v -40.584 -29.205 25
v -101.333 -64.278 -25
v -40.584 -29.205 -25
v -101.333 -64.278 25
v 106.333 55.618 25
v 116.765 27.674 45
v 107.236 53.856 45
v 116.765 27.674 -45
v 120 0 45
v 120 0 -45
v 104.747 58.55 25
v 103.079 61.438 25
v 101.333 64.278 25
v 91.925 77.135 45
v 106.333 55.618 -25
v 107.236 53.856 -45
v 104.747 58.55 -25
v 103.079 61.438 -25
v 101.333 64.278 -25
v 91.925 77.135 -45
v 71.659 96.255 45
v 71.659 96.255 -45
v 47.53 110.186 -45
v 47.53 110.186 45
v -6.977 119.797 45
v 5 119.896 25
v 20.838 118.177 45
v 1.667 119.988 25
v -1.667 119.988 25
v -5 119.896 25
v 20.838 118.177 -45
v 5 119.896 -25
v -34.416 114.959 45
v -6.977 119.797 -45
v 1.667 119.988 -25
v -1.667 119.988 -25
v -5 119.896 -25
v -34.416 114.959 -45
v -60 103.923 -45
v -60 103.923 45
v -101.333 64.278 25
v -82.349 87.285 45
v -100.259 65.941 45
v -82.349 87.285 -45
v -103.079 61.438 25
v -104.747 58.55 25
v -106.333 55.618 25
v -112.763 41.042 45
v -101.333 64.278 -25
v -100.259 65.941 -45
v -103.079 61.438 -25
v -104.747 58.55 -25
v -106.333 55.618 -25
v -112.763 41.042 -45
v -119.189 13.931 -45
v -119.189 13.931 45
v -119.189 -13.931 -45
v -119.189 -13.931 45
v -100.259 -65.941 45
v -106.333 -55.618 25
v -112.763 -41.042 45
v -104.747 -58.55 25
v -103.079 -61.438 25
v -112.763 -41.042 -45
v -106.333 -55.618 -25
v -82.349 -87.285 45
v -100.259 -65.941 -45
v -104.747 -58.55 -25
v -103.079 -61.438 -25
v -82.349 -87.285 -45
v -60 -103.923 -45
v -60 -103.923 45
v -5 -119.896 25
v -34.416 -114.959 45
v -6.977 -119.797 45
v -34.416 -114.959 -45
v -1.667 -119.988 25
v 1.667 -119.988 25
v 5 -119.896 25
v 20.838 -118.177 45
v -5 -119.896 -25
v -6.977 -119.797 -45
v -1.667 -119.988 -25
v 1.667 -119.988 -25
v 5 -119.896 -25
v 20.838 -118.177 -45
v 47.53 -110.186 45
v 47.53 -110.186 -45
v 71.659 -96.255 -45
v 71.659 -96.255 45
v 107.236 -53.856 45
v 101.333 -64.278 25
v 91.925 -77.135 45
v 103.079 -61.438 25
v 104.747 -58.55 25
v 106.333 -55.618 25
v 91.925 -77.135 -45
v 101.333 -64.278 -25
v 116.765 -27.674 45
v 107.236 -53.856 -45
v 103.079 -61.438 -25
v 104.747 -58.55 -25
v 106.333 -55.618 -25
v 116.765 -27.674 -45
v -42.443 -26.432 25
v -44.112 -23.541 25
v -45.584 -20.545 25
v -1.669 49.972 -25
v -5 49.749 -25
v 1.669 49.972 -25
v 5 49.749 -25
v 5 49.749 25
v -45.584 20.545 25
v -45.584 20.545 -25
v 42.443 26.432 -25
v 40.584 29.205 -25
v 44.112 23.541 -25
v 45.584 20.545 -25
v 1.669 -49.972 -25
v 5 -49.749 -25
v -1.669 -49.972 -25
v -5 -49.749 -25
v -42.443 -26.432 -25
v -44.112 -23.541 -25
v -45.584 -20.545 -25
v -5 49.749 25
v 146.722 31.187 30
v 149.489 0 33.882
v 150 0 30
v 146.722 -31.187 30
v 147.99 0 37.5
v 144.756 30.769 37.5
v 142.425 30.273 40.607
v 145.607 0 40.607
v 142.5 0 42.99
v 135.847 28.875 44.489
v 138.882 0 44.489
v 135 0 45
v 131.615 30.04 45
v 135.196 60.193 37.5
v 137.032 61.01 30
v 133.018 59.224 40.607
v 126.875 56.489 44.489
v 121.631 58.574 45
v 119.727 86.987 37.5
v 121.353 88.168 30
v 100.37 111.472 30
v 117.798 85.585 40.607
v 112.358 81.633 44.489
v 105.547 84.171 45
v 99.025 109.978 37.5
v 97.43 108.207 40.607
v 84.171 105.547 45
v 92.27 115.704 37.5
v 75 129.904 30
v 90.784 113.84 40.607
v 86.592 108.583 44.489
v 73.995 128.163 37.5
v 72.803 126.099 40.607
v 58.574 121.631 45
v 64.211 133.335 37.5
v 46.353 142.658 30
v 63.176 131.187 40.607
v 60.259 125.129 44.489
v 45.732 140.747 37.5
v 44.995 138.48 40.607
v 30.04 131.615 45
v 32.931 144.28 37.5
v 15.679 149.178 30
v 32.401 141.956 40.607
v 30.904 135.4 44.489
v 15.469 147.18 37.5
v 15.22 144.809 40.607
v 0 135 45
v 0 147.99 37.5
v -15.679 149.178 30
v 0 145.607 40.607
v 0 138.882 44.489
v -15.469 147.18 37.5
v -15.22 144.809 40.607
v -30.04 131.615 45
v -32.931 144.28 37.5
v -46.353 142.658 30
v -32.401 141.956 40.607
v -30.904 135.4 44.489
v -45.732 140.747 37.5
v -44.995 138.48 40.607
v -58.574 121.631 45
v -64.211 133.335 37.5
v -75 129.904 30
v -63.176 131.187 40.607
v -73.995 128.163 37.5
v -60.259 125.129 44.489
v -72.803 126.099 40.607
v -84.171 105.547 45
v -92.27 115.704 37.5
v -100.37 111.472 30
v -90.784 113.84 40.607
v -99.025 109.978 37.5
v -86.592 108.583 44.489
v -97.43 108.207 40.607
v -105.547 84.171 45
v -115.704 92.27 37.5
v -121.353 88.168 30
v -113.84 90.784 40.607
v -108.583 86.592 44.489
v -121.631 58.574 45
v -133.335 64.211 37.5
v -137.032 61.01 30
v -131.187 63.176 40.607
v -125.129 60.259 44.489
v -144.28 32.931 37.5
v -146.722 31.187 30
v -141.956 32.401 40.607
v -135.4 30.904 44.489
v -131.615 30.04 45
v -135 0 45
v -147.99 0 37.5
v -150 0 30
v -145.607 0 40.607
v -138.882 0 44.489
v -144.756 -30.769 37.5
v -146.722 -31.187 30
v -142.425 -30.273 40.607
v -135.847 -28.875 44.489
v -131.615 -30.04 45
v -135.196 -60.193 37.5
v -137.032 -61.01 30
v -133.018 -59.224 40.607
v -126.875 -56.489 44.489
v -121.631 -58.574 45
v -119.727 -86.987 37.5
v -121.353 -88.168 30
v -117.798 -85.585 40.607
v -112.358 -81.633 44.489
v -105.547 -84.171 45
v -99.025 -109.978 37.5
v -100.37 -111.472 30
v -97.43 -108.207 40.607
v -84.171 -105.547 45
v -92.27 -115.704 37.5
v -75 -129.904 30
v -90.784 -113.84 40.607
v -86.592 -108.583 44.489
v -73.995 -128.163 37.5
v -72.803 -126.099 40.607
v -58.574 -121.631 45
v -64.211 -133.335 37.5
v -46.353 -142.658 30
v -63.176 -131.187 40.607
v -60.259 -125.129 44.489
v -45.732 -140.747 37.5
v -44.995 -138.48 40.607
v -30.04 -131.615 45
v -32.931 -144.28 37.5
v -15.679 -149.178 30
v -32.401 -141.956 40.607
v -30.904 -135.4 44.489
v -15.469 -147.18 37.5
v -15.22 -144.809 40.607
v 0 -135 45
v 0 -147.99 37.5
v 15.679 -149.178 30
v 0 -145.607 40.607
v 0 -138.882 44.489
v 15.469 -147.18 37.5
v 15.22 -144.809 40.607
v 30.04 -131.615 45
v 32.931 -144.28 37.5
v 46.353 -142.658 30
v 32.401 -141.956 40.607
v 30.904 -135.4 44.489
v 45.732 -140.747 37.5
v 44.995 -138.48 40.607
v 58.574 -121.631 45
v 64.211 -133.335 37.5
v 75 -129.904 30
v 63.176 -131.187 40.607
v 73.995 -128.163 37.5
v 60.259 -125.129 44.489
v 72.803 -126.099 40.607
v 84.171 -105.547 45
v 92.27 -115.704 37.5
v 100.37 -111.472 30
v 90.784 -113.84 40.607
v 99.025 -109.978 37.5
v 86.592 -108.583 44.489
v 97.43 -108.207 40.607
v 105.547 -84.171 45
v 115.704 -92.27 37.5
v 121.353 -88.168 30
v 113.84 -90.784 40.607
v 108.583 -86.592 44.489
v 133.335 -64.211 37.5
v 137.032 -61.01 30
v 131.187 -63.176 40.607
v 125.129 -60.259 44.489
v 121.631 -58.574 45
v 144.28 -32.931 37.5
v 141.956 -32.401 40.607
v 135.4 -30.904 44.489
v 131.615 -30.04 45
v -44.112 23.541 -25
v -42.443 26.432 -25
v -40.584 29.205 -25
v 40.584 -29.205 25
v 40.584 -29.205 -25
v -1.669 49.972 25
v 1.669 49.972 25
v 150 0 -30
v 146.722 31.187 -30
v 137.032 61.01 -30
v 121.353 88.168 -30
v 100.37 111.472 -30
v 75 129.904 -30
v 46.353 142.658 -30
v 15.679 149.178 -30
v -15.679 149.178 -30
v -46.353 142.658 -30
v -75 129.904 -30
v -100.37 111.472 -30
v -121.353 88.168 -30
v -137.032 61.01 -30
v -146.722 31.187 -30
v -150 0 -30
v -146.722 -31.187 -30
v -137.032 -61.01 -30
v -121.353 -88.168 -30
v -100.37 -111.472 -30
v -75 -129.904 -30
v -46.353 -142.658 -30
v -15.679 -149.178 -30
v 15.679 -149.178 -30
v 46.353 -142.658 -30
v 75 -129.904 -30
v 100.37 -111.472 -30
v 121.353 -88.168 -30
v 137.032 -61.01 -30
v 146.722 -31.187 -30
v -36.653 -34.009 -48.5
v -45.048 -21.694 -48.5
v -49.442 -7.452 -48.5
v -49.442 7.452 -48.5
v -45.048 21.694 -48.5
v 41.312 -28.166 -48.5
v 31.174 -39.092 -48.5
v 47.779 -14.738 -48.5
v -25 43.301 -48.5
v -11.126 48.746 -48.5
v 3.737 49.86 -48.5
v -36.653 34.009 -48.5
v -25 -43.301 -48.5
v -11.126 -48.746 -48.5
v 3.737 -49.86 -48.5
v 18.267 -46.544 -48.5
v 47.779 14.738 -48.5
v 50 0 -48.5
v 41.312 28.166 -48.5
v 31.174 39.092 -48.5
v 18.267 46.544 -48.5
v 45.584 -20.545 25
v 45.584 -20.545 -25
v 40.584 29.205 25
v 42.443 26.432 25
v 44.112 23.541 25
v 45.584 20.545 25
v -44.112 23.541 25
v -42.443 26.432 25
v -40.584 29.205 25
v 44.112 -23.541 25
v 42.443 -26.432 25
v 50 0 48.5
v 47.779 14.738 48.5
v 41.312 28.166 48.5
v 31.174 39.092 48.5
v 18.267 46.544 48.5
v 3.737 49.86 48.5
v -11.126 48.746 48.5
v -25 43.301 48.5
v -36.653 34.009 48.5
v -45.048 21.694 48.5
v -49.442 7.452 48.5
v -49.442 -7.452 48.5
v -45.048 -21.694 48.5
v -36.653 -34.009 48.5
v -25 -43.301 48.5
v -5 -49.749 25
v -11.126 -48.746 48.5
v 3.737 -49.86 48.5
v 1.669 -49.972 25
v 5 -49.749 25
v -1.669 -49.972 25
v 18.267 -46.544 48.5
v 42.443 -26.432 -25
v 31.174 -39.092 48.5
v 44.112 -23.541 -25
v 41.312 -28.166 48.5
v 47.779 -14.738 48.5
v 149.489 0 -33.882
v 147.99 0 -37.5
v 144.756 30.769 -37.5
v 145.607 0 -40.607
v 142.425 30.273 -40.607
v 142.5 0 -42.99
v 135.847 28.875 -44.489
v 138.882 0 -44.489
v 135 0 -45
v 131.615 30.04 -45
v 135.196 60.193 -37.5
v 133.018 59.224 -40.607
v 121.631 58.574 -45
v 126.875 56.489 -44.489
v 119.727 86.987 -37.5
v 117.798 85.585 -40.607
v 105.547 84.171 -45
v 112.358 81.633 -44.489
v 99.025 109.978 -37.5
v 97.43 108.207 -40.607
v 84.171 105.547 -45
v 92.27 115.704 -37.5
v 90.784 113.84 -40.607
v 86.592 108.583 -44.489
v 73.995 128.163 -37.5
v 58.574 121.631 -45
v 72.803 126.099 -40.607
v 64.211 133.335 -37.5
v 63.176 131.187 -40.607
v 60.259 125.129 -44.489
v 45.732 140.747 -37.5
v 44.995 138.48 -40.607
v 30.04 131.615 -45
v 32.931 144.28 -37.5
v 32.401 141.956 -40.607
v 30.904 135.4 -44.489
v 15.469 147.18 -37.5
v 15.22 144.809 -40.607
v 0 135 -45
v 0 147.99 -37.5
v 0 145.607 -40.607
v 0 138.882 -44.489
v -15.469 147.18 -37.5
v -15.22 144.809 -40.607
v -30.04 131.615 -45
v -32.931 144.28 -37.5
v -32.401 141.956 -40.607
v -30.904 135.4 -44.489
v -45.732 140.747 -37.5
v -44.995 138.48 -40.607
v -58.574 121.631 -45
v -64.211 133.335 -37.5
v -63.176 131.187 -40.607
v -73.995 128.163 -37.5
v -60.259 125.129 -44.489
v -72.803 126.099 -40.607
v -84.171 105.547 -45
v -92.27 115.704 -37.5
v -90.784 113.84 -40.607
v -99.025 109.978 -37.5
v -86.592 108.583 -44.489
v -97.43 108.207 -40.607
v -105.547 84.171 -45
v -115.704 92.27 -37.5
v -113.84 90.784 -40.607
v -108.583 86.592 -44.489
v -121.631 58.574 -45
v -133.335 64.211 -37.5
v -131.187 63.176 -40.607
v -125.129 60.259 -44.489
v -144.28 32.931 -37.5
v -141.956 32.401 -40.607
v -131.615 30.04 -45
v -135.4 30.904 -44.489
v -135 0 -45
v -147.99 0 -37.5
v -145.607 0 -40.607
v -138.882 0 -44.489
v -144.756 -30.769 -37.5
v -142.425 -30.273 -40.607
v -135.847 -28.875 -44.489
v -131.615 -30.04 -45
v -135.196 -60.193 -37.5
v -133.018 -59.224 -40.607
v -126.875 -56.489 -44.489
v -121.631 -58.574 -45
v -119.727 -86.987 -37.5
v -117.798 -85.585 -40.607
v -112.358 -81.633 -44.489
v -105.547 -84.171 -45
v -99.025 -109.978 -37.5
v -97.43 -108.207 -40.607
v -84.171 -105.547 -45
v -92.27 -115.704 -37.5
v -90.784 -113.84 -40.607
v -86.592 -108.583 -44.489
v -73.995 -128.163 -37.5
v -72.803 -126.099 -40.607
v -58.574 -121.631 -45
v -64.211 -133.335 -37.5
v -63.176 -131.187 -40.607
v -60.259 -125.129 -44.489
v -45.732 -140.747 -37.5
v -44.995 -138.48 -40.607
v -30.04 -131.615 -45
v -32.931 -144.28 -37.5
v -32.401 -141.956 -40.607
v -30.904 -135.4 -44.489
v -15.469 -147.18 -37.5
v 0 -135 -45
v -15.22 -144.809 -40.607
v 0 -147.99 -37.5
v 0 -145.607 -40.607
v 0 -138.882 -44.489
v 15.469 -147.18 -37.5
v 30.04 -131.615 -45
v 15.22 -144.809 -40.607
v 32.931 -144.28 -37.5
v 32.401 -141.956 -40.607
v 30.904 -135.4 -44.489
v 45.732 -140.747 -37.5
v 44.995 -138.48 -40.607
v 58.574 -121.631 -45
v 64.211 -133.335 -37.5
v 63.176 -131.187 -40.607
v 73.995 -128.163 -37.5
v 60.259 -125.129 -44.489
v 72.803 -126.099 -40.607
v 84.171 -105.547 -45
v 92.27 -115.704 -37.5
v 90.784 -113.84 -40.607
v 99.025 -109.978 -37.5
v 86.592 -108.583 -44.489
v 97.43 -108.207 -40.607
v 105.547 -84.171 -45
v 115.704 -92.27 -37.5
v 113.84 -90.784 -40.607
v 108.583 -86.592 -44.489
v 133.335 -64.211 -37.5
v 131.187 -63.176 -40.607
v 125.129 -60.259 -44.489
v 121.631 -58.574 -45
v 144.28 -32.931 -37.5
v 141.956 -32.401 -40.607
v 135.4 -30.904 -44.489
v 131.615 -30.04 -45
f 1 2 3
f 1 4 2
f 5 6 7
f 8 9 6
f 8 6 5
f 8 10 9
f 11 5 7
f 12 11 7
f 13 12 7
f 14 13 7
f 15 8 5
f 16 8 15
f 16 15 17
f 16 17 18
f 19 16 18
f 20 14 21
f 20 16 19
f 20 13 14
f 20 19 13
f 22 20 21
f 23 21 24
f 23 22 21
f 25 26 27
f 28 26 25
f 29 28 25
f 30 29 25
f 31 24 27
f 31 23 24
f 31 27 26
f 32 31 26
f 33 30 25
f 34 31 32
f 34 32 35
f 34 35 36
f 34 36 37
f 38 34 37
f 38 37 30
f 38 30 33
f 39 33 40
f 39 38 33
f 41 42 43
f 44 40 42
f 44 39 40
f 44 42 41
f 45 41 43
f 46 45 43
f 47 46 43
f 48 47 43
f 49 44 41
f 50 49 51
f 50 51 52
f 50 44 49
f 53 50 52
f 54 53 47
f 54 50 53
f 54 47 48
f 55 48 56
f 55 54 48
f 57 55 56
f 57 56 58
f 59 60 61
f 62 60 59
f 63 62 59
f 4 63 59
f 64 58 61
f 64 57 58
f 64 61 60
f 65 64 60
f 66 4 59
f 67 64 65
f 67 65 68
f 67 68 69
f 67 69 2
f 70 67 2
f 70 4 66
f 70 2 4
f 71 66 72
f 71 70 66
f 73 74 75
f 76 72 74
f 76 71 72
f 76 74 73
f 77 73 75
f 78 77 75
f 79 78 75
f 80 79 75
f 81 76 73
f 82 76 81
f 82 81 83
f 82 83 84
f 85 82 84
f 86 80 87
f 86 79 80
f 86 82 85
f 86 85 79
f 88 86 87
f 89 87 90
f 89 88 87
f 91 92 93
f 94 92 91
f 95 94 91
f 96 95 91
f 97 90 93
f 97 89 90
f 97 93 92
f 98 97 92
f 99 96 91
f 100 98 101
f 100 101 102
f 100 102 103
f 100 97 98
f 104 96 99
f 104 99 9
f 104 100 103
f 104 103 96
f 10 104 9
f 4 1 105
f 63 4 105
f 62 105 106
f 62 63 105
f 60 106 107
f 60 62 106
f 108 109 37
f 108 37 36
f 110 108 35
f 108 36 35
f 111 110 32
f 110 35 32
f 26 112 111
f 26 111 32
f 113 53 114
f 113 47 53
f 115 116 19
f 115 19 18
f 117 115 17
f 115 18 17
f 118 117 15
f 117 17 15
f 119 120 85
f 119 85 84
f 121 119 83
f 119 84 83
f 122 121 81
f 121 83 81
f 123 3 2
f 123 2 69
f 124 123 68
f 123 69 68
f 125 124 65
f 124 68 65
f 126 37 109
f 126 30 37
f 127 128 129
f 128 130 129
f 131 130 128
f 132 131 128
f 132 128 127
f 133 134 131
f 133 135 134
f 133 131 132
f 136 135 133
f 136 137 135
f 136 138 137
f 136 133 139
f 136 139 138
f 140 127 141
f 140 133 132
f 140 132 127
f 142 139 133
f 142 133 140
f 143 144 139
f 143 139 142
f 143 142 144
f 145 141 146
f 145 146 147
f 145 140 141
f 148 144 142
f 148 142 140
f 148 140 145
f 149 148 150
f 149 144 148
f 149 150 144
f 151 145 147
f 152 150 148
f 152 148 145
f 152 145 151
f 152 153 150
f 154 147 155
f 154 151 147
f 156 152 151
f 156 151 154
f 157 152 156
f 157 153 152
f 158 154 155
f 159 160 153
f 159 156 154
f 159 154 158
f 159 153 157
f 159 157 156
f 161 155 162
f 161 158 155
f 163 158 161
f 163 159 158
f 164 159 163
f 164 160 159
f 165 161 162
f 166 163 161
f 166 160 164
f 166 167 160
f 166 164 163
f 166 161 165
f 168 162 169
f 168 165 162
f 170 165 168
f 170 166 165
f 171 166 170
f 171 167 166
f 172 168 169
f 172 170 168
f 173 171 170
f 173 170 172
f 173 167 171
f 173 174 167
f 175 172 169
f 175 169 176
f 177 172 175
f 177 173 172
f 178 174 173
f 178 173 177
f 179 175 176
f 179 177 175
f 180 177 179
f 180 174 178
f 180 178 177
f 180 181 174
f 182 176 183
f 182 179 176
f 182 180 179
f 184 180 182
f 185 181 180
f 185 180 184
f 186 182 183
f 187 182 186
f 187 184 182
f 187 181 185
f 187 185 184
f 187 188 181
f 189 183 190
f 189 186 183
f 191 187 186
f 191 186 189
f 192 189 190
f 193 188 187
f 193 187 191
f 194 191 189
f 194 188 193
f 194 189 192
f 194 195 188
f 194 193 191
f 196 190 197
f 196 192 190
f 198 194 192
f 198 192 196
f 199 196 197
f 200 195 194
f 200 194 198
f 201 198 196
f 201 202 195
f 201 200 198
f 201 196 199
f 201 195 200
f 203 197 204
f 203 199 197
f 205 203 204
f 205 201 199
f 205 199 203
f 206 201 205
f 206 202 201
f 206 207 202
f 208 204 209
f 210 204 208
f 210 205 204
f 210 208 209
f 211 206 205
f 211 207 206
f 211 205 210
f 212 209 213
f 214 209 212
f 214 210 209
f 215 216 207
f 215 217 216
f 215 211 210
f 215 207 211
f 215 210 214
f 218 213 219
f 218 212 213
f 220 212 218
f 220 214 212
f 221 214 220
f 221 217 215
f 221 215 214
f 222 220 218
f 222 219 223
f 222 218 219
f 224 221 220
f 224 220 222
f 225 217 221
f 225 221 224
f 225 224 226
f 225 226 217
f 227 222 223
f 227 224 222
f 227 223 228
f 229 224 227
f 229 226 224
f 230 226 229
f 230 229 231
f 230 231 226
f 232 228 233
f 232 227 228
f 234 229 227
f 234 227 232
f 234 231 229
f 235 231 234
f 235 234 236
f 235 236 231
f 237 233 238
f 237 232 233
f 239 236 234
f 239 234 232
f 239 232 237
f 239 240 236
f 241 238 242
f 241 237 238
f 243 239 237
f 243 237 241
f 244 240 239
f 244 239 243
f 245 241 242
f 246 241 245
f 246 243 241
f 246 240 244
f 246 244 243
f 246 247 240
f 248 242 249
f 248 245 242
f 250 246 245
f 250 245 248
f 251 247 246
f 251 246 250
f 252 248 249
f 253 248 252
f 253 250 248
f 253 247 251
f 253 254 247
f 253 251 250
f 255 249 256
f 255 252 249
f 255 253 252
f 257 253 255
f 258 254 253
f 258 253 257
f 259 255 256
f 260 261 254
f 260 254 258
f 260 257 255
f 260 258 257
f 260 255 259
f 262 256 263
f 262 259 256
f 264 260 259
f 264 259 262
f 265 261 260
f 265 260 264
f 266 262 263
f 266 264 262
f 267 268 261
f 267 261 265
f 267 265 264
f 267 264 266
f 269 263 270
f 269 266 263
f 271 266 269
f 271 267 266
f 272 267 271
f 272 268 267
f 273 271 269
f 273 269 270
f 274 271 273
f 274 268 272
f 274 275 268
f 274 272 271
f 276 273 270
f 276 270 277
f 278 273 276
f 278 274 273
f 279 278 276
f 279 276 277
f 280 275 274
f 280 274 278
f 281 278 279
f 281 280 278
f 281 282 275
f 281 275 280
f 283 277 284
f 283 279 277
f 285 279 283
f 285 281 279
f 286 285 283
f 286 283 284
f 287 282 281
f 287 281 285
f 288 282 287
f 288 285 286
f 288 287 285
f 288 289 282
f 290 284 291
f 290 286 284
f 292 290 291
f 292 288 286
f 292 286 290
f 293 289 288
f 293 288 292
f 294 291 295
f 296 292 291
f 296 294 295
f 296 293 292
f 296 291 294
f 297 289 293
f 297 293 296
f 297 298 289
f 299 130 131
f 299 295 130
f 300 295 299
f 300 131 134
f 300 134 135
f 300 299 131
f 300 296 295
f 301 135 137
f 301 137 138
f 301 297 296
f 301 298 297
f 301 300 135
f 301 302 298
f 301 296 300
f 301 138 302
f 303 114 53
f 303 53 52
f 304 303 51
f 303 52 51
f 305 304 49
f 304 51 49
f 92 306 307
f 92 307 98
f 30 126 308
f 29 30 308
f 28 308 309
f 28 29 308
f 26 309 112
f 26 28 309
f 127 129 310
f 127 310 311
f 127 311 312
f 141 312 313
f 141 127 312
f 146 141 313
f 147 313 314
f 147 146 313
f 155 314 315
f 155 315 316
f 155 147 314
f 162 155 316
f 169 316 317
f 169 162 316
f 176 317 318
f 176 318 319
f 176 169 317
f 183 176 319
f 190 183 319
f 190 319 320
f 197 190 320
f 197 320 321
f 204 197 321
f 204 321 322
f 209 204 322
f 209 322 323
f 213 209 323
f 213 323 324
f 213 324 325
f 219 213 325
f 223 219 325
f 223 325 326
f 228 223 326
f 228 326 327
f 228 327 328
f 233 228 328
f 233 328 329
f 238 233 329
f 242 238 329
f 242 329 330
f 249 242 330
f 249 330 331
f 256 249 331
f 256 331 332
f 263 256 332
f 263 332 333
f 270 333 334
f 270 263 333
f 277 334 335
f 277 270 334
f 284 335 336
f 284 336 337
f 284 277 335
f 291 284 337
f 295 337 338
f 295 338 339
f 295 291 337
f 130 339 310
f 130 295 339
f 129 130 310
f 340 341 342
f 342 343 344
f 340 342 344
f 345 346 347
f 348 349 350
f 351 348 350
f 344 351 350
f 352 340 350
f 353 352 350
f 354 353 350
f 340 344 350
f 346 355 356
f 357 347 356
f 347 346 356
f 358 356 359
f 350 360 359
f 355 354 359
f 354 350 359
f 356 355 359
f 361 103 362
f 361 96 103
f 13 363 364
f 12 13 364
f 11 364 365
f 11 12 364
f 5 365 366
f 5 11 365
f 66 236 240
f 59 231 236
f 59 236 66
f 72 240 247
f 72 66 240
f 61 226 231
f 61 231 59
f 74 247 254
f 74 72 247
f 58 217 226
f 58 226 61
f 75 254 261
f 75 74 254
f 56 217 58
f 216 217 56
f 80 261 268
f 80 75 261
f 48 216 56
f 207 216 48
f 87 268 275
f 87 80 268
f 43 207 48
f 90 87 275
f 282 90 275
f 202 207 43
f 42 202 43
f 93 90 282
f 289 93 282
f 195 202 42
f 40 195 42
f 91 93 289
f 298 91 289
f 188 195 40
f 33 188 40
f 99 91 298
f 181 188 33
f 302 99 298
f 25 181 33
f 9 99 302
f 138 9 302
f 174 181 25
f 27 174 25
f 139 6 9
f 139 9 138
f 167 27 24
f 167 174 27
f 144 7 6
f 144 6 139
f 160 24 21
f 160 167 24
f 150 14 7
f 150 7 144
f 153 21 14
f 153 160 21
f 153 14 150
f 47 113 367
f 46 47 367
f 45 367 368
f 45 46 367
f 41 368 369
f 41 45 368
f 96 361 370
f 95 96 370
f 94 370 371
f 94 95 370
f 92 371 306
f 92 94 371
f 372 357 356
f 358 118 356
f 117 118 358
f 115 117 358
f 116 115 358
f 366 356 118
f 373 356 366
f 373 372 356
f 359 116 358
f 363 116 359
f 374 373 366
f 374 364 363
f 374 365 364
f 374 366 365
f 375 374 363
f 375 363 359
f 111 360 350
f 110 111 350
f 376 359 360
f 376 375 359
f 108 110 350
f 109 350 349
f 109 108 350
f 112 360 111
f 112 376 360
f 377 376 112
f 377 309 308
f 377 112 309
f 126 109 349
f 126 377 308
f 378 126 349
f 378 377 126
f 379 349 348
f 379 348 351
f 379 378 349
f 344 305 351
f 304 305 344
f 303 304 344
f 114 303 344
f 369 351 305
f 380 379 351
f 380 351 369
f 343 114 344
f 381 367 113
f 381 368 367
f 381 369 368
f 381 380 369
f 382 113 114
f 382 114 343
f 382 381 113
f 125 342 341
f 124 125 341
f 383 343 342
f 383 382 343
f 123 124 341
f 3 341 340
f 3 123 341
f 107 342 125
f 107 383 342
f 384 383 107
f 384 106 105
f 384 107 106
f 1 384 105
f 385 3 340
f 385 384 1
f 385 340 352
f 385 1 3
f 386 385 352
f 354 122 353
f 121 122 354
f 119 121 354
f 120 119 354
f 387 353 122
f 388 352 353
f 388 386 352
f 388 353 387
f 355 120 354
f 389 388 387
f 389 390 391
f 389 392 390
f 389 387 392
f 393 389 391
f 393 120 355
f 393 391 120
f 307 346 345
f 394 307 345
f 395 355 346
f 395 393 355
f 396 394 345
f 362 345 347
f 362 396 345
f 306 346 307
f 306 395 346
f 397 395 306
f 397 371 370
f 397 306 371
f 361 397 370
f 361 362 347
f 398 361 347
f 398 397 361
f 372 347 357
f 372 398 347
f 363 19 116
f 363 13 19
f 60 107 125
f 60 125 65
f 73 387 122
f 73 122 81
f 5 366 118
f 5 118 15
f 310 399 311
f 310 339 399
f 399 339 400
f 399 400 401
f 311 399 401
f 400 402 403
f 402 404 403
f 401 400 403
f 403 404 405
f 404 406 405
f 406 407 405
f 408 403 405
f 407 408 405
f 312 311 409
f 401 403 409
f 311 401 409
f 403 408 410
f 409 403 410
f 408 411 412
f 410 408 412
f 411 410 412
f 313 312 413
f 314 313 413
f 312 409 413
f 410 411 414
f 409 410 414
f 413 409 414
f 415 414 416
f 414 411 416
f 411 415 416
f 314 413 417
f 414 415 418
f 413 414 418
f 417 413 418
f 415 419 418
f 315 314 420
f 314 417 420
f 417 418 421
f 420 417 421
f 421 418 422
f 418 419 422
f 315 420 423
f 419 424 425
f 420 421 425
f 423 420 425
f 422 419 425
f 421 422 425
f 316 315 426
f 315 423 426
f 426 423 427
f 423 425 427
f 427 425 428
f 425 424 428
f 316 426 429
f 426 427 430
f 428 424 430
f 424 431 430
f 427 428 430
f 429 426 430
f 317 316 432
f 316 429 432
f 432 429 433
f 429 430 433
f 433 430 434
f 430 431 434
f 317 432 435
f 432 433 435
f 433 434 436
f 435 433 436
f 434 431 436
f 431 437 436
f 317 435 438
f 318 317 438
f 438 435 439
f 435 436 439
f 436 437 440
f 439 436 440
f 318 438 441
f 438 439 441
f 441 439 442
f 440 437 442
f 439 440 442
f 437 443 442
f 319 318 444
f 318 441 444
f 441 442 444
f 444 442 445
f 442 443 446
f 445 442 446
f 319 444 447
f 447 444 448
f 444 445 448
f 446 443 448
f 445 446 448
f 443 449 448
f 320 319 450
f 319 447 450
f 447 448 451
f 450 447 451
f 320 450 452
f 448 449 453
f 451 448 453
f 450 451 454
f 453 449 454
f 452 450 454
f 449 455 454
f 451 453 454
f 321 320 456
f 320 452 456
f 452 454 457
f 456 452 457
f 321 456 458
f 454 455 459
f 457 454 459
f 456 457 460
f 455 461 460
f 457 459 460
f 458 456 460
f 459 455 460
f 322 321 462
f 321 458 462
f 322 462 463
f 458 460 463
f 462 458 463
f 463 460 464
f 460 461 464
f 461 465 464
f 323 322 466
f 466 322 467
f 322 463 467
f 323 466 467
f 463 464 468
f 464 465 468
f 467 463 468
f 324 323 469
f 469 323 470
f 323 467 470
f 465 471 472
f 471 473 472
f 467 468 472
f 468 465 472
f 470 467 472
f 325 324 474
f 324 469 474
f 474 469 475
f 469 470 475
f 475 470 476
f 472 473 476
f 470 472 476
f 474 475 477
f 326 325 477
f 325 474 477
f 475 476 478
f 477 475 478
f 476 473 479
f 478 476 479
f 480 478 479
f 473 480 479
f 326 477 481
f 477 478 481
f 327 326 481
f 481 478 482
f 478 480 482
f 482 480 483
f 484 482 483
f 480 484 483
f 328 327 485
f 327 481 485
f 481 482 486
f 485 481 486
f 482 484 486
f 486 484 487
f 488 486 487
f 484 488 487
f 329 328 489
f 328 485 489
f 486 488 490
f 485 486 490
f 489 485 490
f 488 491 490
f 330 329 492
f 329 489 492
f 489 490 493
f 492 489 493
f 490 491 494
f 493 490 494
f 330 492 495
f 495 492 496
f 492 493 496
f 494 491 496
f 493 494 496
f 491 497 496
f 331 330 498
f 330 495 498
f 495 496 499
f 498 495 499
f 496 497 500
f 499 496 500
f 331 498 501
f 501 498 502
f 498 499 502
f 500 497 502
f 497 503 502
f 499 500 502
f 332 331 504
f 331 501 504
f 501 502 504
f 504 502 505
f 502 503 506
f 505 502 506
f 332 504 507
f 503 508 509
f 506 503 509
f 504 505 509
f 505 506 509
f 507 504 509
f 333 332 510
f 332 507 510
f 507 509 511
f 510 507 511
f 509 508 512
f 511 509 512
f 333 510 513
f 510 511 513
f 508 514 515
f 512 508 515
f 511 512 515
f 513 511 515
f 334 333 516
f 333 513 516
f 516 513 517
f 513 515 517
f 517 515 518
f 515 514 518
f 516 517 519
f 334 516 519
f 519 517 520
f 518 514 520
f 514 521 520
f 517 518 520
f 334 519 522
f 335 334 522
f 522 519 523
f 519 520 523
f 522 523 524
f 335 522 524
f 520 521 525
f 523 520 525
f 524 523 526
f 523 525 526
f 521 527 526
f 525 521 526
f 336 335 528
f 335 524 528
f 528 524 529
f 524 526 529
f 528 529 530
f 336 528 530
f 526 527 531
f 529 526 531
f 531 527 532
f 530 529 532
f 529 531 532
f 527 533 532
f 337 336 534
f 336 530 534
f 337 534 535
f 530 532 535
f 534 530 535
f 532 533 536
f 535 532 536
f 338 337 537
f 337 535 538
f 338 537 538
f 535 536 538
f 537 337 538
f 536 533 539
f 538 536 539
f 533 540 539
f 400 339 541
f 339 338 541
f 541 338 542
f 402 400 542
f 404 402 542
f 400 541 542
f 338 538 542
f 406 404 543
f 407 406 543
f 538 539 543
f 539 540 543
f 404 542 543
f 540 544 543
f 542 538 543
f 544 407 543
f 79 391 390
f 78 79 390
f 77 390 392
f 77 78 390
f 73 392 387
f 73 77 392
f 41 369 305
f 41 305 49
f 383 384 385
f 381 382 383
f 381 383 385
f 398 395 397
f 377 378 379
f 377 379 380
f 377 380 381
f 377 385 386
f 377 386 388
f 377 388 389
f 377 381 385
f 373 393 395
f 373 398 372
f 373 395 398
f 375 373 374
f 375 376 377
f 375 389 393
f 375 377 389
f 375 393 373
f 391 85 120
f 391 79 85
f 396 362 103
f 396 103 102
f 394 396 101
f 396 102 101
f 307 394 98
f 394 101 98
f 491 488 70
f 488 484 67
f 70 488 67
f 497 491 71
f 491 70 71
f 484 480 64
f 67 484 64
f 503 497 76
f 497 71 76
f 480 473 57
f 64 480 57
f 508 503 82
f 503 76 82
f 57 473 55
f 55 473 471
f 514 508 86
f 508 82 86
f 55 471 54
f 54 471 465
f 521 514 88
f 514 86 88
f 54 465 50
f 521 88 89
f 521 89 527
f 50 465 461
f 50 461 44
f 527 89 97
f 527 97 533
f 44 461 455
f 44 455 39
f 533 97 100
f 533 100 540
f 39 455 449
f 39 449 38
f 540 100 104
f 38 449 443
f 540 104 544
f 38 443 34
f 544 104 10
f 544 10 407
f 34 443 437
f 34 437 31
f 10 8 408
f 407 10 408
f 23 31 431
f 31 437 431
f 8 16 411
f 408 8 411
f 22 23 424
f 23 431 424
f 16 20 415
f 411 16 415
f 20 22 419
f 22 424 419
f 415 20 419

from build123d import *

# Parameters (mm, degrees)
SKETCH1_R           = 50
BOSS_EXTRUDE1_DEPTH = 48.5
SKETCH2_R           = 150
SKETCH2_R_2         = 120
BOSS_EXTRUDE2_DEPTH = 45
BOSS_EXTRUDE3_DEPTH = 25
CIRPATTERN15_COUNT  = 6
FILLET1_R           = 15


with BuildPart() as part:
    # Sketch1 → Boss-Extrude1 (new, symmetric)
    with BuildSketch(Plane.XY):
        Circle(SKETCH1_R)
    extrude(amount=BOSS_EXTRUDE1_DEPTH, both=True)



with BuildPart() as body_2:
    # Sketch2 → Boss-Extrude2 (new, symmetric)
    with BuildSketch(Plane.XY):
        Circle(SKETCH2_R)
        Circle(SKETCH2_R_2, mode=Mode.SUBTRACT)
    extrude(amount=BOSS_EXTRUDE2_DEPTH, both=True)


with BuildPart() as part_1:
    add(part.part)

    add(body_2.part)  # Boss-Extrude3 merges body 2
    # Sketch3 → Boss-Extrude3 (add, symmetric)
    with BuildSketch(Plane.XY):
        with BuildLine():
            Line((-5, 119.895788083), (-5, 49.749371855))
            ThreePointArc((-5, 49.749371855), (0, 50), (5, 49.749371855))
            Line((5, 49.749371855), (5, 119.895788083))
            ThreePointArc((5, 119.895788083), (0, 120), (-5, 119.895788083))
        make_face()
    boss_extrude3 = extrude(amount=BOSS_EXTRUDE3_DEPTH, both=True)

    # CirPattern15: Boss-Extrude3 ×6 about axis
    cirpattern15_axis = Axis((0, 0, -53.35), (0, 0, 1))
    for i in range(1, CIRPATTERN15_COUNT):
        add(boss_extrude3.rotate(cirpattern15_axis, i * 360 / CIRPATTERN15_COUNT))

    # Fillet1
    fillet1_edges = [part_1.edges().sort_by_distance(p)[0] for p in [
        (-150, 0, -45),
        (-150, 0, 45),
    ]]
    fillet(fillet1_edges, radius=FILLET1_R)


solid = part_1.part
